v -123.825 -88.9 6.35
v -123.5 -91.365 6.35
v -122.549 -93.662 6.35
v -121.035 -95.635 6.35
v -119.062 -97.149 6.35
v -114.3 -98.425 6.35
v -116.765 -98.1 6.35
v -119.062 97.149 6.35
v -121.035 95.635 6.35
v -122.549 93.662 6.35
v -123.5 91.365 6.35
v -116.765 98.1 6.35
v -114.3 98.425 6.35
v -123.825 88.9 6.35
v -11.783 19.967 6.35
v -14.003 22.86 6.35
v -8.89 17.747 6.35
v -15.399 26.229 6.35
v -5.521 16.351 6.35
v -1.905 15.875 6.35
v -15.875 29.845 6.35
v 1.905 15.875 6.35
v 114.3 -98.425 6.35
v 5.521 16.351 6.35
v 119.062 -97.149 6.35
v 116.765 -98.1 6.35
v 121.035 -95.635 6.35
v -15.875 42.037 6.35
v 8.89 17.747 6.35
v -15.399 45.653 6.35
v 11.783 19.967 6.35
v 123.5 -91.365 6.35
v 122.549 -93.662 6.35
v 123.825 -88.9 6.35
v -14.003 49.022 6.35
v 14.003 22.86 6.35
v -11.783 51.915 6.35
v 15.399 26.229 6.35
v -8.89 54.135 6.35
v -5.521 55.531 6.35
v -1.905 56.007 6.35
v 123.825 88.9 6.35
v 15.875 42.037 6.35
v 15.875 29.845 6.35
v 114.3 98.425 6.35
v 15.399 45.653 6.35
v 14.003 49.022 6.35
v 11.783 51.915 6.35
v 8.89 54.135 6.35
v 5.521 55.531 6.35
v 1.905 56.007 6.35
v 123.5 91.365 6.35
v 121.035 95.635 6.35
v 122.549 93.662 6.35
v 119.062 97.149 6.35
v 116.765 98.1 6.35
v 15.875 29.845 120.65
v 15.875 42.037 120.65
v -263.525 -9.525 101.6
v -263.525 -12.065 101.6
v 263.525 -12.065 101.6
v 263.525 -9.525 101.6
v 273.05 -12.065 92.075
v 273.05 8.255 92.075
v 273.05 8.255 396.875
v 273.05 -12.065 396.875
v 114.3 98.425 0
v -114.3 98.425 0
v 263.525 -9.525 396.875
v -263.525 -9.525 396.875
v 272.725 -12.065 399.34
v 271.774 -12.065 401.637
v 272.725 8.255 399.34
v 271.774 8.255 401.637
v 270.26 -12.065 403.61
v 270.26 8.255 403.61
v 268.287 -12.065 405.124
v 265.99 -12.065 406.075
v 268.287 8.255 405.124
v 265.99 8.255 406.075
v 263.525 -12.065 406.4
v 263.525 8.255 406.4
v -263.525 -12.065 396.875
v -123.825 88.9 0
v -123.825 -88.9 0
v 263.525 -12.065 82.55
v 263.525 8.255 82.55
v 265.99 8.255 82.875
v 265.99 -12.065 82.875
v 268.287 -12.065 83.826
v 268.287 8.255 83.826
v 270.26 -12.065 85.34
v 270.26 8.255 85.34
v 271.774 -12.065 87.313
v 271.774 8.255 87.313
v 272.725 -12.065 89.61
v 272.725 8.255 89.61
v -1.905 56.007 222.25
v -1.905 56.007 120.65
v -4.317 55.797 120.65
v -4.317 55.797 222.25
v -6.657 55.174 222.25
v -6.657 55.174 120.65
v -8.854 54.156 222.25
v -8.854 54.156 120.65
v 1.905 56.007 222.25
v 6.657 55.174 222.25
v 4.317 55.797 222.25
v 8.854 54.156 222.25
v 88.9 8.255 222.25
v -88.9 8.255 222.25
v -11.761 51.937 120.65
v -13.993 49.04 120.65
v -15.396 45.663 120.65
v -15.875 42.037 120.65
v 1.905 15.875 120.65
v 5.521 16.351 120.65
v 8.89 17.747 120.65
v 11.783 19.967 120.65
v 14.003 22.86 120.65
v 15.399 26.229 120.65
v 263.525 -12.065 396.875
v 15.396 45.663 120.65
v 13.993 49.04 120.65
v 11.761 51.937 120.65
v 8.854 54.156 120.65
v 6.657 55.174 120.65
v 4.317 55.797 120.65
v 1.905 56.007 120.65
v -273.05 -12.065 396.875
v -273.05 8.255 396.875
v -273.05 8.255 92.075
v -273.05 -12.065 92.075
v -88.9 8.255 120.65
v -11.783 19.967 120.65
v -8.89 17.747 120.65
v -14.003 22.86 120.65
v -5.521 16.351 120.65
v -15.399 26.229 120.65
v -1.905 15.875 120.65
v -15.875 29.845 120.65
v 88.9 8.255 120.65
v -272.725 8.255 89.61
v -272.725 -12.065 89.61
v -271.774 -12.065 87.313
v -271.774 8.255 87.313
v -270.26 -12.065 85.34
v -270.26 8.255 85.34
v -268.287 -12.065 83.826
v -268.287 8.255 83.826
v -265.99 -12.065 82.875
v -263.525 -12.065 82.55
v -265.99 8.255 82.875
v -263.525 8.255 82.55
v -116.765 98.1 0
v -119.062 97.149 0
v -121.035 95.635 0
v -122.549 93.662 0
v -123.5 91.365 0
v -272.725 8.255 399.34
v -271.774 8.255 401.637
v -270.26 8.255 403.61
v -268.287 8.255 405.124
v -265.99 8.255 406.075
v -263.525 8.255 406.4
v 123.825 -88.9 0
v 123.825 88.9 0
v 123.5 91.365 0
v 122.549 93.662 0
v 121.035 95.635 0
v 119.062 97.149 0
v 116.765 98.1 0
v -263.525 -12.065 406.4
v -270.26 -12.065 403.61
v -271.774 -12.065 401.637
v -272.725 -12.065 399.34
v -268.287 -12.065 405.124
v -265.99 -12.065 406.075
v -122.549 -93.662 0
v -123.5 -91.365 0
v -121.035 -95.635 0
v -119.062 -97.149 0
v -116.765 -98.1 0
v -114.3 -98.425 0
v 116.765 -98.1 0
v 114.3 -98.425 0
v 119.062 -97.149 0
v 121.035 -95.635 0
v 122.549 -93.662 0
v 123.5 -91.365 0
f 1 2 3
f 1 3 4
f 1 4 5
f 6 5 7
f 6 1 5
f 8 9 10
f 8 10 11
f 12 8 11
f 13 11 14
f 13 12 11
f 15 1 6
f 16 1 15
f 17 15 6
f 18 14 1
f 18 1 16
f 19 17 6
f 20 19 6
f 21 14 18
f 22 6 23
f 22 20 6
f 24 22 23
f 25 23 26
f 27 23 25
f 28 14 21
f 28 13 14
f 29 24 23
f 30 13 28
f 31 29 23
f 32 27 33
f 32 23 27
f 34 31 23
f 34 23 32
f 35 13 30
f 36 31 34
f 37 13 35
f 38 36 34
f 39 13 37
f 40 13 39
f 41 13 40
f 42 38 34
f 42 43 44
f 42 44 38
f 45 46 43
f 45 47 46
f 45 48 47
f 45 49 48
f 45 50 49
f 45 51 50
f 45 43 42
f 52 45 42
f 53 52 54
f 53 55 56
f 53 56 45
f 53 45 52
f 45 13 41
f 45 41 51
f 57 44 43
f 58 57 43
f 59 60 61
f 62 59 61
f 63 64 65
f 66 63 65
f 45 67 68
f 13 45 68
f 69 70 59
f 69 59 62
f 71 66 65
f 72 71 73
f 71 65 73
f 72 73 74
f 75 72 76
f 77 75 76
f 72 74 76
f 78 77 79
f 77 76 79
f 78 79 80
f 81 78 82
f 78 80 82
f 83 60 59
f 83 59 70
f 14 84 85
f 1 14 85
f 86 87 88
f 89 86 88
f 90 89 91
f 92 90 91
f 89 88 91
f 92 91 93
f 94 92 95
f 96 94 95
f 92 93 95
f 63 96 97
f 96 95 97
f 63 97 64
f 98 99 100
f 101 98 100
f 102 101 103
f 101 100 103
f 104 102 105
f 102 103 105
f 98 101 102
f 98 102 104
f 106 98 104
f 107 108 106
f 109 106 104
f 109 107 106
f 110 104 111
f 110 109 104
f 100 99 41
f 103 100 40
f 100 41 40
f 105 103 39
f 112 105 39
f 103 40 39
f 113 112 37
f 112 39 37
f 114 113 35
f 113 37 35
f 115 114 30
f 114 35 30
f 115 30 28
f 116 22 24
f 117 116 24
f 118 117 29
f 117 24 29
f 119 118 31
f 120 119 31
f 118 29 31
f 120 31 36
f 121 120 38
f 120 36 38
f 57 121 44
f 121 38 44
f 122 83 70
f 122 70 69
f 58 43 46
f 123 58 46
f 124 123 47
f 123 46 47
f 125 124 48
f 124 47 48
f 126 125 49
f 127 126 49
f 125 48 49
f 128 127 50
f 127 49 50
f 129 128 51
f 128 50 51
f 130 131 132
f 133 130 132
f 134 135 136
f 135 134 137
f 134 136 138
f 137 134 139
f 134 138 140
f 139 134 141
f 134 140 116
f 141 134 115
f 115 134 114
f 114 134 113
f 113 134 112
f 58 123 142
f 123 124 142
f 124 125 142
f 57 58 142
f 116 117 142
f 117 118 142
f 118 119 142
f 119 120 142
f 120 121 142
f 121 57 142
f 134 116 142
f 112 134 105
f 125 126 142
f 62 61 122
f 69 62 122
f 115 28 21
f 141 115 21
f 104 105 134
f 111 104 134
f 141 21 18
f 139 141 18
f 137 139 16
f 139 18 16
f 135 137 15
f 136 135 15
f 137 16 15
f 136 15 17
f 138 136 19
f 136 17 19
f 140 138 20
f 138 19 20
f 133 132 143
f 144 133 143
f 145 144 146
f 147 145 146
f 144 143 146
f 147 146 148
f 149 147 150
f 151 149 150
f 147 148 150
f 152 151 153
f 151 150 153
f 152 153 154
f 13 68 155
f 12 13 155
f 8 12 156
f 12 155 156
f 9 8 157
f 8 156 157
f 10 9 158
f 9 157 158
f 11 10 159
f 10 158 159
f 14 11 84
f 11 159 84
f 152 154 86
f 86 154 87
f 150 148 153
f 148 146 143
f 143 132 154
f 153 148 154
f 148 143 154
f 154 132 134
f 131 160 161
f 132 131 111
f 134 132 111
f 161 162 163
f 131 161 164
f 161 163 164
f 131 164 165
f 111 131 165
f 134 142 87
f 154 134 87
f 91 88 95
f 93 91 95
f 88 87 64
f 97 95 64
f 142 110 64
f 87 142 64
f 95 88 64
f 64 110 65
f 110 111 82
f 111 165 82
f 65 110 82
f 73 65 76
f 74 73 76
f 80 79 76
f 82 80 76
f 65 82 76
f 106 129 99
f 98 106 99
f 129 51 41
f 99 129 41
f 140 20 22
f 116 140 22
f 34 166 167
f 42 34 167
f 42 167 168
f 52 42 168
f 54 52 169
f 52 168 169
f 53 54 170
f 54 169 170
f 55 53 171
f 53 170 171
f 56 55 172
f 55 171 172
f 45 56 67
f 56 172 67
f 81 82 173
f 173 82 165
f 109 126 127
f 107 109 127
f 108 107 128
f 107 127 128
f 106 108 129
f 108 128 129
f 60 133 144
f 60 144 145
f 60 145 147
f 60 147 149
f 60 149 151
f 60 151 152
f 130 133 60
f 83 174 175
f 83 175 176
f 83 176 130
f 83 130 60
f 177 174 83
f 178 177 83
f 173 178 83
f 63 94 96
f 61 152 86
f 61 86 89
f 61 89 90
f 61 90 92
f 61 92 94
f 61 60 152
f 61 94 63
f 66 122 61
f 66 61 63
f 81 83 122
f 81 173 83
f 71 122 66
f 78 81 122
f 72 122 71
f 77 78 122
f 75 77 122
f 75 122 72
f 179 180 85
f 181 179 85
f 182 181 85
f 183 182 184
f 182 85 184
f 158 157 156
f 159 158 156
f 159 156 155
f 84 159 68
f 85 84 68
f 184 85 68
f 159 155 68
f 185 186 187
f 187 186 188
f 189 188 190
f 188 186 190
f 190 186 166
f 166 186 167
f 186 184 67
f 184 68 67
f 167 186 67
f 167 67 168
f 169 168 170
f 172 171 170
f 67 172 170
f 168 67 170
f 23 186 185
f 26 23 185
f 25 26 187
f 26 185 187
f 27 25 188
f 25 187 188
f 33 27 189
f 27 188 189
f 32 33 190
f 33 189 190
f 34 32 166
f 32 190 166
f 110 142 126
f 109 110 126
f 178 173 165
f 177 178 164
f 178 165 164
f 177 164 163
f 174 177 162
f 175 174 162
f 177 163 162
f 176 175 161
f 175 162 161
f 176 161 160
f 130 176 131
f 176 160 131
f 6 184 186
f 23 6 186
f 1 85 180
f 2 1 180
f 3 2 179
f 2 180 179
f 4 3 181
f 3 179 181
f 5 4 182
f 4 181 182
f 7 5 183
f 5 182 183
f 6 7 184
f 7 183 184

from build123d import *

# Parameters (mm, degrees)
F1_DEPTH = 6.35
F3_DEPTH = 114.3
F5_DEPTH = 101.6
F7_DEPTH = 20.32
F8_W     = 527.05
F8_H     = 295.275
F9_DEPTH = 2.54


with BuildPart() as f1:
    # F0 (on Top) → F1 (new body)
    with BuildSketch(Plane.XY):
        with BuildLine():
            Line((-114.3, -98.425), (114.3, -98.425))
            ThreePointArc((114.3, -98.425), (121.0351920908, -95.6351920908), (123.825, -88.9))
            Line((123.825, -88.9), (123.825, 88.9))
            ThreePointArc((123.825, 88.9), (121.0351920908, 95.6351920908), (114.3, 98.425))
            Line((114.3, 98.425), (-114.3, 98.425))
            ThreePointArc((-114.3, 98.425), (-121.0351920908, 95.6351920908), (-123.825, 88.9))
            Line((-123.825, 88.9), (-123.825, -88.9))
            ThreePointArc((-123.825, -88.9), (-121.0351920908, -95.6351920908), (-114.3, -98.425))
        make_face()
    extrude(amount=F1_DEPTH)

    # F2 (on face) → F3 (join)
    with BuildSketch(Plane.XY.offset(6.35)):
        with BuildLine():
            Line((-1.905, 15.875), (1.905, 15.875))
            ThreePointArc((1.905, 15.875), (11.7832817332, 19.9667182668), (15.875, 29.845))
            Line((15.875, 29.845), (15.875, 42.037))
            ThreePointArc((15.875, 42.037), (11.7832817332, 51.9152817332), (1.905, 56.007))
            Line((1.905, 56.007), (-1.905, 56.007))
            ThreePointArc((-1.905, 56.007), (-11.7832817332, 51.9152817332), (-15.875, 42.037))
            Line((-15.875, 42.037), (-15.875, 29.845))
            ThreePointArc((-15.875, 29.845), (-11.7832817332, 19.9667182668), (-1.905, 15.875))
        make_face()
    extrude(amount=F3_DEPTH)

    # F4 (on face) → F5 (join)
    with BuildSketch(Plane.XY.offset(120.65)):
        with BuildLine():
            ThreePointArc((-15.875, 42.037), (-13.9930859093, 49.0397908043), (-8.8543730782, 54.1558742802))
            Line((-8.8543730782, 54.1558742802), (-88.9, 8.255))
            Line((-88.9, 8.255), (88.9, 8.255))
            Line((88.9, 8.255), (8.8543730782, 54.1558742802))
            ThreePointArc((8.8543730782, 54.1558742802), (13.9930859093, 49.0397908043), (15.875, 42.037))
            Line((15.875, 42.037), (15.875, 29.845))
            ThreePointArc((15.875, 29.845), (11.7832817332, 19.9667182668), (1.905, 15.875))
            Line((1.905, 15.875), (-1.905, 15.875))
            ThreePointArc((-1.905, 15.875), (-11.7832817332, 19.9667182668), (-15.875, 29.845))
            Line((-15.875, 29.845), (-15.875, 42.037))
        make_face()
        with BuildLine():
            ThreePointArc((-1.905, 56.007), (-5.5008466531, 55.536288383), (-8.8543730782, 54.1558742802))
            ThreePointArc((-8.8543730782, 54.1558742802), (-13.9930859093, 49.0397908043), (-15.875, 42.037))
            Line((-15.875, 42.037), (-15.875, 29.845))
            ThreePointArc((-15.875, 29.845), (-11.7832817332, 19.9667182668), (-1.905, 15.875))
            Line((-1.905, 15.875), (1.905, 15.875))
            ThreePointArc((1.905, 15.875), (11.7832817332, 19.9667182668), (15.875, 29.845))
            Line((15.875, 29.845), (15.875, 42.037))
            ThreePointArc((15.875, 42.037), (13.9930859093, 49.0397908043), (8.8543730782, 54.1558742802))
            ThreePointArc((8.8543730782, 54.1558742802), (5.5008466531, 55.536288383), (1.905, 56.007))
            Line((1.905, 56.007), (-1.905, 56.007))
        make_face()
    extrude(amount=F5_DEPTH)

    # F6 (on face) → F7 (join)
    with BuildSketch(Plane.XZ.offset(-8.255)):
        with BuildLine():
            Line((263.525, 406.4), (-263.525, 406.4))
            ThreePointArc((-263.525, 406.4), (-270.2601920908, 403.6101920908), (-273.05, 396.875))
            Line((-273.05, 396.875), (-273.05, 92.075))
            ThreePointArc((-273.05, 92.075), (-270.2601920908, 85.3398079092), (-263.525, 82.55))
            Line((-263.525, 82.55), (263.525, 82.55))
            ThreePointArc((263.525, 82.55), (270.2601920908, 85.3398079092), (273.05, 92.075))
            Line((273.05, 92.075), (273.05, 396.875))
            ThreePointArc((273.05, 396.875), (270.2601920908, 403.6101920908), (263.525, 406.4))
        make_face()
    extrude(amount=F7_DEPTH)

    # F8 (on face) → F9 (cut)
    with BuildSketch(Plane.XZ.offset(12.065)):
        with Locations((0, 249.2375)):
            Rectangle(F8_W, F8_H)
    extrude(amount=-F9_DEPTH, mode=Mode.SUBTRACT)


solid = f1.part
